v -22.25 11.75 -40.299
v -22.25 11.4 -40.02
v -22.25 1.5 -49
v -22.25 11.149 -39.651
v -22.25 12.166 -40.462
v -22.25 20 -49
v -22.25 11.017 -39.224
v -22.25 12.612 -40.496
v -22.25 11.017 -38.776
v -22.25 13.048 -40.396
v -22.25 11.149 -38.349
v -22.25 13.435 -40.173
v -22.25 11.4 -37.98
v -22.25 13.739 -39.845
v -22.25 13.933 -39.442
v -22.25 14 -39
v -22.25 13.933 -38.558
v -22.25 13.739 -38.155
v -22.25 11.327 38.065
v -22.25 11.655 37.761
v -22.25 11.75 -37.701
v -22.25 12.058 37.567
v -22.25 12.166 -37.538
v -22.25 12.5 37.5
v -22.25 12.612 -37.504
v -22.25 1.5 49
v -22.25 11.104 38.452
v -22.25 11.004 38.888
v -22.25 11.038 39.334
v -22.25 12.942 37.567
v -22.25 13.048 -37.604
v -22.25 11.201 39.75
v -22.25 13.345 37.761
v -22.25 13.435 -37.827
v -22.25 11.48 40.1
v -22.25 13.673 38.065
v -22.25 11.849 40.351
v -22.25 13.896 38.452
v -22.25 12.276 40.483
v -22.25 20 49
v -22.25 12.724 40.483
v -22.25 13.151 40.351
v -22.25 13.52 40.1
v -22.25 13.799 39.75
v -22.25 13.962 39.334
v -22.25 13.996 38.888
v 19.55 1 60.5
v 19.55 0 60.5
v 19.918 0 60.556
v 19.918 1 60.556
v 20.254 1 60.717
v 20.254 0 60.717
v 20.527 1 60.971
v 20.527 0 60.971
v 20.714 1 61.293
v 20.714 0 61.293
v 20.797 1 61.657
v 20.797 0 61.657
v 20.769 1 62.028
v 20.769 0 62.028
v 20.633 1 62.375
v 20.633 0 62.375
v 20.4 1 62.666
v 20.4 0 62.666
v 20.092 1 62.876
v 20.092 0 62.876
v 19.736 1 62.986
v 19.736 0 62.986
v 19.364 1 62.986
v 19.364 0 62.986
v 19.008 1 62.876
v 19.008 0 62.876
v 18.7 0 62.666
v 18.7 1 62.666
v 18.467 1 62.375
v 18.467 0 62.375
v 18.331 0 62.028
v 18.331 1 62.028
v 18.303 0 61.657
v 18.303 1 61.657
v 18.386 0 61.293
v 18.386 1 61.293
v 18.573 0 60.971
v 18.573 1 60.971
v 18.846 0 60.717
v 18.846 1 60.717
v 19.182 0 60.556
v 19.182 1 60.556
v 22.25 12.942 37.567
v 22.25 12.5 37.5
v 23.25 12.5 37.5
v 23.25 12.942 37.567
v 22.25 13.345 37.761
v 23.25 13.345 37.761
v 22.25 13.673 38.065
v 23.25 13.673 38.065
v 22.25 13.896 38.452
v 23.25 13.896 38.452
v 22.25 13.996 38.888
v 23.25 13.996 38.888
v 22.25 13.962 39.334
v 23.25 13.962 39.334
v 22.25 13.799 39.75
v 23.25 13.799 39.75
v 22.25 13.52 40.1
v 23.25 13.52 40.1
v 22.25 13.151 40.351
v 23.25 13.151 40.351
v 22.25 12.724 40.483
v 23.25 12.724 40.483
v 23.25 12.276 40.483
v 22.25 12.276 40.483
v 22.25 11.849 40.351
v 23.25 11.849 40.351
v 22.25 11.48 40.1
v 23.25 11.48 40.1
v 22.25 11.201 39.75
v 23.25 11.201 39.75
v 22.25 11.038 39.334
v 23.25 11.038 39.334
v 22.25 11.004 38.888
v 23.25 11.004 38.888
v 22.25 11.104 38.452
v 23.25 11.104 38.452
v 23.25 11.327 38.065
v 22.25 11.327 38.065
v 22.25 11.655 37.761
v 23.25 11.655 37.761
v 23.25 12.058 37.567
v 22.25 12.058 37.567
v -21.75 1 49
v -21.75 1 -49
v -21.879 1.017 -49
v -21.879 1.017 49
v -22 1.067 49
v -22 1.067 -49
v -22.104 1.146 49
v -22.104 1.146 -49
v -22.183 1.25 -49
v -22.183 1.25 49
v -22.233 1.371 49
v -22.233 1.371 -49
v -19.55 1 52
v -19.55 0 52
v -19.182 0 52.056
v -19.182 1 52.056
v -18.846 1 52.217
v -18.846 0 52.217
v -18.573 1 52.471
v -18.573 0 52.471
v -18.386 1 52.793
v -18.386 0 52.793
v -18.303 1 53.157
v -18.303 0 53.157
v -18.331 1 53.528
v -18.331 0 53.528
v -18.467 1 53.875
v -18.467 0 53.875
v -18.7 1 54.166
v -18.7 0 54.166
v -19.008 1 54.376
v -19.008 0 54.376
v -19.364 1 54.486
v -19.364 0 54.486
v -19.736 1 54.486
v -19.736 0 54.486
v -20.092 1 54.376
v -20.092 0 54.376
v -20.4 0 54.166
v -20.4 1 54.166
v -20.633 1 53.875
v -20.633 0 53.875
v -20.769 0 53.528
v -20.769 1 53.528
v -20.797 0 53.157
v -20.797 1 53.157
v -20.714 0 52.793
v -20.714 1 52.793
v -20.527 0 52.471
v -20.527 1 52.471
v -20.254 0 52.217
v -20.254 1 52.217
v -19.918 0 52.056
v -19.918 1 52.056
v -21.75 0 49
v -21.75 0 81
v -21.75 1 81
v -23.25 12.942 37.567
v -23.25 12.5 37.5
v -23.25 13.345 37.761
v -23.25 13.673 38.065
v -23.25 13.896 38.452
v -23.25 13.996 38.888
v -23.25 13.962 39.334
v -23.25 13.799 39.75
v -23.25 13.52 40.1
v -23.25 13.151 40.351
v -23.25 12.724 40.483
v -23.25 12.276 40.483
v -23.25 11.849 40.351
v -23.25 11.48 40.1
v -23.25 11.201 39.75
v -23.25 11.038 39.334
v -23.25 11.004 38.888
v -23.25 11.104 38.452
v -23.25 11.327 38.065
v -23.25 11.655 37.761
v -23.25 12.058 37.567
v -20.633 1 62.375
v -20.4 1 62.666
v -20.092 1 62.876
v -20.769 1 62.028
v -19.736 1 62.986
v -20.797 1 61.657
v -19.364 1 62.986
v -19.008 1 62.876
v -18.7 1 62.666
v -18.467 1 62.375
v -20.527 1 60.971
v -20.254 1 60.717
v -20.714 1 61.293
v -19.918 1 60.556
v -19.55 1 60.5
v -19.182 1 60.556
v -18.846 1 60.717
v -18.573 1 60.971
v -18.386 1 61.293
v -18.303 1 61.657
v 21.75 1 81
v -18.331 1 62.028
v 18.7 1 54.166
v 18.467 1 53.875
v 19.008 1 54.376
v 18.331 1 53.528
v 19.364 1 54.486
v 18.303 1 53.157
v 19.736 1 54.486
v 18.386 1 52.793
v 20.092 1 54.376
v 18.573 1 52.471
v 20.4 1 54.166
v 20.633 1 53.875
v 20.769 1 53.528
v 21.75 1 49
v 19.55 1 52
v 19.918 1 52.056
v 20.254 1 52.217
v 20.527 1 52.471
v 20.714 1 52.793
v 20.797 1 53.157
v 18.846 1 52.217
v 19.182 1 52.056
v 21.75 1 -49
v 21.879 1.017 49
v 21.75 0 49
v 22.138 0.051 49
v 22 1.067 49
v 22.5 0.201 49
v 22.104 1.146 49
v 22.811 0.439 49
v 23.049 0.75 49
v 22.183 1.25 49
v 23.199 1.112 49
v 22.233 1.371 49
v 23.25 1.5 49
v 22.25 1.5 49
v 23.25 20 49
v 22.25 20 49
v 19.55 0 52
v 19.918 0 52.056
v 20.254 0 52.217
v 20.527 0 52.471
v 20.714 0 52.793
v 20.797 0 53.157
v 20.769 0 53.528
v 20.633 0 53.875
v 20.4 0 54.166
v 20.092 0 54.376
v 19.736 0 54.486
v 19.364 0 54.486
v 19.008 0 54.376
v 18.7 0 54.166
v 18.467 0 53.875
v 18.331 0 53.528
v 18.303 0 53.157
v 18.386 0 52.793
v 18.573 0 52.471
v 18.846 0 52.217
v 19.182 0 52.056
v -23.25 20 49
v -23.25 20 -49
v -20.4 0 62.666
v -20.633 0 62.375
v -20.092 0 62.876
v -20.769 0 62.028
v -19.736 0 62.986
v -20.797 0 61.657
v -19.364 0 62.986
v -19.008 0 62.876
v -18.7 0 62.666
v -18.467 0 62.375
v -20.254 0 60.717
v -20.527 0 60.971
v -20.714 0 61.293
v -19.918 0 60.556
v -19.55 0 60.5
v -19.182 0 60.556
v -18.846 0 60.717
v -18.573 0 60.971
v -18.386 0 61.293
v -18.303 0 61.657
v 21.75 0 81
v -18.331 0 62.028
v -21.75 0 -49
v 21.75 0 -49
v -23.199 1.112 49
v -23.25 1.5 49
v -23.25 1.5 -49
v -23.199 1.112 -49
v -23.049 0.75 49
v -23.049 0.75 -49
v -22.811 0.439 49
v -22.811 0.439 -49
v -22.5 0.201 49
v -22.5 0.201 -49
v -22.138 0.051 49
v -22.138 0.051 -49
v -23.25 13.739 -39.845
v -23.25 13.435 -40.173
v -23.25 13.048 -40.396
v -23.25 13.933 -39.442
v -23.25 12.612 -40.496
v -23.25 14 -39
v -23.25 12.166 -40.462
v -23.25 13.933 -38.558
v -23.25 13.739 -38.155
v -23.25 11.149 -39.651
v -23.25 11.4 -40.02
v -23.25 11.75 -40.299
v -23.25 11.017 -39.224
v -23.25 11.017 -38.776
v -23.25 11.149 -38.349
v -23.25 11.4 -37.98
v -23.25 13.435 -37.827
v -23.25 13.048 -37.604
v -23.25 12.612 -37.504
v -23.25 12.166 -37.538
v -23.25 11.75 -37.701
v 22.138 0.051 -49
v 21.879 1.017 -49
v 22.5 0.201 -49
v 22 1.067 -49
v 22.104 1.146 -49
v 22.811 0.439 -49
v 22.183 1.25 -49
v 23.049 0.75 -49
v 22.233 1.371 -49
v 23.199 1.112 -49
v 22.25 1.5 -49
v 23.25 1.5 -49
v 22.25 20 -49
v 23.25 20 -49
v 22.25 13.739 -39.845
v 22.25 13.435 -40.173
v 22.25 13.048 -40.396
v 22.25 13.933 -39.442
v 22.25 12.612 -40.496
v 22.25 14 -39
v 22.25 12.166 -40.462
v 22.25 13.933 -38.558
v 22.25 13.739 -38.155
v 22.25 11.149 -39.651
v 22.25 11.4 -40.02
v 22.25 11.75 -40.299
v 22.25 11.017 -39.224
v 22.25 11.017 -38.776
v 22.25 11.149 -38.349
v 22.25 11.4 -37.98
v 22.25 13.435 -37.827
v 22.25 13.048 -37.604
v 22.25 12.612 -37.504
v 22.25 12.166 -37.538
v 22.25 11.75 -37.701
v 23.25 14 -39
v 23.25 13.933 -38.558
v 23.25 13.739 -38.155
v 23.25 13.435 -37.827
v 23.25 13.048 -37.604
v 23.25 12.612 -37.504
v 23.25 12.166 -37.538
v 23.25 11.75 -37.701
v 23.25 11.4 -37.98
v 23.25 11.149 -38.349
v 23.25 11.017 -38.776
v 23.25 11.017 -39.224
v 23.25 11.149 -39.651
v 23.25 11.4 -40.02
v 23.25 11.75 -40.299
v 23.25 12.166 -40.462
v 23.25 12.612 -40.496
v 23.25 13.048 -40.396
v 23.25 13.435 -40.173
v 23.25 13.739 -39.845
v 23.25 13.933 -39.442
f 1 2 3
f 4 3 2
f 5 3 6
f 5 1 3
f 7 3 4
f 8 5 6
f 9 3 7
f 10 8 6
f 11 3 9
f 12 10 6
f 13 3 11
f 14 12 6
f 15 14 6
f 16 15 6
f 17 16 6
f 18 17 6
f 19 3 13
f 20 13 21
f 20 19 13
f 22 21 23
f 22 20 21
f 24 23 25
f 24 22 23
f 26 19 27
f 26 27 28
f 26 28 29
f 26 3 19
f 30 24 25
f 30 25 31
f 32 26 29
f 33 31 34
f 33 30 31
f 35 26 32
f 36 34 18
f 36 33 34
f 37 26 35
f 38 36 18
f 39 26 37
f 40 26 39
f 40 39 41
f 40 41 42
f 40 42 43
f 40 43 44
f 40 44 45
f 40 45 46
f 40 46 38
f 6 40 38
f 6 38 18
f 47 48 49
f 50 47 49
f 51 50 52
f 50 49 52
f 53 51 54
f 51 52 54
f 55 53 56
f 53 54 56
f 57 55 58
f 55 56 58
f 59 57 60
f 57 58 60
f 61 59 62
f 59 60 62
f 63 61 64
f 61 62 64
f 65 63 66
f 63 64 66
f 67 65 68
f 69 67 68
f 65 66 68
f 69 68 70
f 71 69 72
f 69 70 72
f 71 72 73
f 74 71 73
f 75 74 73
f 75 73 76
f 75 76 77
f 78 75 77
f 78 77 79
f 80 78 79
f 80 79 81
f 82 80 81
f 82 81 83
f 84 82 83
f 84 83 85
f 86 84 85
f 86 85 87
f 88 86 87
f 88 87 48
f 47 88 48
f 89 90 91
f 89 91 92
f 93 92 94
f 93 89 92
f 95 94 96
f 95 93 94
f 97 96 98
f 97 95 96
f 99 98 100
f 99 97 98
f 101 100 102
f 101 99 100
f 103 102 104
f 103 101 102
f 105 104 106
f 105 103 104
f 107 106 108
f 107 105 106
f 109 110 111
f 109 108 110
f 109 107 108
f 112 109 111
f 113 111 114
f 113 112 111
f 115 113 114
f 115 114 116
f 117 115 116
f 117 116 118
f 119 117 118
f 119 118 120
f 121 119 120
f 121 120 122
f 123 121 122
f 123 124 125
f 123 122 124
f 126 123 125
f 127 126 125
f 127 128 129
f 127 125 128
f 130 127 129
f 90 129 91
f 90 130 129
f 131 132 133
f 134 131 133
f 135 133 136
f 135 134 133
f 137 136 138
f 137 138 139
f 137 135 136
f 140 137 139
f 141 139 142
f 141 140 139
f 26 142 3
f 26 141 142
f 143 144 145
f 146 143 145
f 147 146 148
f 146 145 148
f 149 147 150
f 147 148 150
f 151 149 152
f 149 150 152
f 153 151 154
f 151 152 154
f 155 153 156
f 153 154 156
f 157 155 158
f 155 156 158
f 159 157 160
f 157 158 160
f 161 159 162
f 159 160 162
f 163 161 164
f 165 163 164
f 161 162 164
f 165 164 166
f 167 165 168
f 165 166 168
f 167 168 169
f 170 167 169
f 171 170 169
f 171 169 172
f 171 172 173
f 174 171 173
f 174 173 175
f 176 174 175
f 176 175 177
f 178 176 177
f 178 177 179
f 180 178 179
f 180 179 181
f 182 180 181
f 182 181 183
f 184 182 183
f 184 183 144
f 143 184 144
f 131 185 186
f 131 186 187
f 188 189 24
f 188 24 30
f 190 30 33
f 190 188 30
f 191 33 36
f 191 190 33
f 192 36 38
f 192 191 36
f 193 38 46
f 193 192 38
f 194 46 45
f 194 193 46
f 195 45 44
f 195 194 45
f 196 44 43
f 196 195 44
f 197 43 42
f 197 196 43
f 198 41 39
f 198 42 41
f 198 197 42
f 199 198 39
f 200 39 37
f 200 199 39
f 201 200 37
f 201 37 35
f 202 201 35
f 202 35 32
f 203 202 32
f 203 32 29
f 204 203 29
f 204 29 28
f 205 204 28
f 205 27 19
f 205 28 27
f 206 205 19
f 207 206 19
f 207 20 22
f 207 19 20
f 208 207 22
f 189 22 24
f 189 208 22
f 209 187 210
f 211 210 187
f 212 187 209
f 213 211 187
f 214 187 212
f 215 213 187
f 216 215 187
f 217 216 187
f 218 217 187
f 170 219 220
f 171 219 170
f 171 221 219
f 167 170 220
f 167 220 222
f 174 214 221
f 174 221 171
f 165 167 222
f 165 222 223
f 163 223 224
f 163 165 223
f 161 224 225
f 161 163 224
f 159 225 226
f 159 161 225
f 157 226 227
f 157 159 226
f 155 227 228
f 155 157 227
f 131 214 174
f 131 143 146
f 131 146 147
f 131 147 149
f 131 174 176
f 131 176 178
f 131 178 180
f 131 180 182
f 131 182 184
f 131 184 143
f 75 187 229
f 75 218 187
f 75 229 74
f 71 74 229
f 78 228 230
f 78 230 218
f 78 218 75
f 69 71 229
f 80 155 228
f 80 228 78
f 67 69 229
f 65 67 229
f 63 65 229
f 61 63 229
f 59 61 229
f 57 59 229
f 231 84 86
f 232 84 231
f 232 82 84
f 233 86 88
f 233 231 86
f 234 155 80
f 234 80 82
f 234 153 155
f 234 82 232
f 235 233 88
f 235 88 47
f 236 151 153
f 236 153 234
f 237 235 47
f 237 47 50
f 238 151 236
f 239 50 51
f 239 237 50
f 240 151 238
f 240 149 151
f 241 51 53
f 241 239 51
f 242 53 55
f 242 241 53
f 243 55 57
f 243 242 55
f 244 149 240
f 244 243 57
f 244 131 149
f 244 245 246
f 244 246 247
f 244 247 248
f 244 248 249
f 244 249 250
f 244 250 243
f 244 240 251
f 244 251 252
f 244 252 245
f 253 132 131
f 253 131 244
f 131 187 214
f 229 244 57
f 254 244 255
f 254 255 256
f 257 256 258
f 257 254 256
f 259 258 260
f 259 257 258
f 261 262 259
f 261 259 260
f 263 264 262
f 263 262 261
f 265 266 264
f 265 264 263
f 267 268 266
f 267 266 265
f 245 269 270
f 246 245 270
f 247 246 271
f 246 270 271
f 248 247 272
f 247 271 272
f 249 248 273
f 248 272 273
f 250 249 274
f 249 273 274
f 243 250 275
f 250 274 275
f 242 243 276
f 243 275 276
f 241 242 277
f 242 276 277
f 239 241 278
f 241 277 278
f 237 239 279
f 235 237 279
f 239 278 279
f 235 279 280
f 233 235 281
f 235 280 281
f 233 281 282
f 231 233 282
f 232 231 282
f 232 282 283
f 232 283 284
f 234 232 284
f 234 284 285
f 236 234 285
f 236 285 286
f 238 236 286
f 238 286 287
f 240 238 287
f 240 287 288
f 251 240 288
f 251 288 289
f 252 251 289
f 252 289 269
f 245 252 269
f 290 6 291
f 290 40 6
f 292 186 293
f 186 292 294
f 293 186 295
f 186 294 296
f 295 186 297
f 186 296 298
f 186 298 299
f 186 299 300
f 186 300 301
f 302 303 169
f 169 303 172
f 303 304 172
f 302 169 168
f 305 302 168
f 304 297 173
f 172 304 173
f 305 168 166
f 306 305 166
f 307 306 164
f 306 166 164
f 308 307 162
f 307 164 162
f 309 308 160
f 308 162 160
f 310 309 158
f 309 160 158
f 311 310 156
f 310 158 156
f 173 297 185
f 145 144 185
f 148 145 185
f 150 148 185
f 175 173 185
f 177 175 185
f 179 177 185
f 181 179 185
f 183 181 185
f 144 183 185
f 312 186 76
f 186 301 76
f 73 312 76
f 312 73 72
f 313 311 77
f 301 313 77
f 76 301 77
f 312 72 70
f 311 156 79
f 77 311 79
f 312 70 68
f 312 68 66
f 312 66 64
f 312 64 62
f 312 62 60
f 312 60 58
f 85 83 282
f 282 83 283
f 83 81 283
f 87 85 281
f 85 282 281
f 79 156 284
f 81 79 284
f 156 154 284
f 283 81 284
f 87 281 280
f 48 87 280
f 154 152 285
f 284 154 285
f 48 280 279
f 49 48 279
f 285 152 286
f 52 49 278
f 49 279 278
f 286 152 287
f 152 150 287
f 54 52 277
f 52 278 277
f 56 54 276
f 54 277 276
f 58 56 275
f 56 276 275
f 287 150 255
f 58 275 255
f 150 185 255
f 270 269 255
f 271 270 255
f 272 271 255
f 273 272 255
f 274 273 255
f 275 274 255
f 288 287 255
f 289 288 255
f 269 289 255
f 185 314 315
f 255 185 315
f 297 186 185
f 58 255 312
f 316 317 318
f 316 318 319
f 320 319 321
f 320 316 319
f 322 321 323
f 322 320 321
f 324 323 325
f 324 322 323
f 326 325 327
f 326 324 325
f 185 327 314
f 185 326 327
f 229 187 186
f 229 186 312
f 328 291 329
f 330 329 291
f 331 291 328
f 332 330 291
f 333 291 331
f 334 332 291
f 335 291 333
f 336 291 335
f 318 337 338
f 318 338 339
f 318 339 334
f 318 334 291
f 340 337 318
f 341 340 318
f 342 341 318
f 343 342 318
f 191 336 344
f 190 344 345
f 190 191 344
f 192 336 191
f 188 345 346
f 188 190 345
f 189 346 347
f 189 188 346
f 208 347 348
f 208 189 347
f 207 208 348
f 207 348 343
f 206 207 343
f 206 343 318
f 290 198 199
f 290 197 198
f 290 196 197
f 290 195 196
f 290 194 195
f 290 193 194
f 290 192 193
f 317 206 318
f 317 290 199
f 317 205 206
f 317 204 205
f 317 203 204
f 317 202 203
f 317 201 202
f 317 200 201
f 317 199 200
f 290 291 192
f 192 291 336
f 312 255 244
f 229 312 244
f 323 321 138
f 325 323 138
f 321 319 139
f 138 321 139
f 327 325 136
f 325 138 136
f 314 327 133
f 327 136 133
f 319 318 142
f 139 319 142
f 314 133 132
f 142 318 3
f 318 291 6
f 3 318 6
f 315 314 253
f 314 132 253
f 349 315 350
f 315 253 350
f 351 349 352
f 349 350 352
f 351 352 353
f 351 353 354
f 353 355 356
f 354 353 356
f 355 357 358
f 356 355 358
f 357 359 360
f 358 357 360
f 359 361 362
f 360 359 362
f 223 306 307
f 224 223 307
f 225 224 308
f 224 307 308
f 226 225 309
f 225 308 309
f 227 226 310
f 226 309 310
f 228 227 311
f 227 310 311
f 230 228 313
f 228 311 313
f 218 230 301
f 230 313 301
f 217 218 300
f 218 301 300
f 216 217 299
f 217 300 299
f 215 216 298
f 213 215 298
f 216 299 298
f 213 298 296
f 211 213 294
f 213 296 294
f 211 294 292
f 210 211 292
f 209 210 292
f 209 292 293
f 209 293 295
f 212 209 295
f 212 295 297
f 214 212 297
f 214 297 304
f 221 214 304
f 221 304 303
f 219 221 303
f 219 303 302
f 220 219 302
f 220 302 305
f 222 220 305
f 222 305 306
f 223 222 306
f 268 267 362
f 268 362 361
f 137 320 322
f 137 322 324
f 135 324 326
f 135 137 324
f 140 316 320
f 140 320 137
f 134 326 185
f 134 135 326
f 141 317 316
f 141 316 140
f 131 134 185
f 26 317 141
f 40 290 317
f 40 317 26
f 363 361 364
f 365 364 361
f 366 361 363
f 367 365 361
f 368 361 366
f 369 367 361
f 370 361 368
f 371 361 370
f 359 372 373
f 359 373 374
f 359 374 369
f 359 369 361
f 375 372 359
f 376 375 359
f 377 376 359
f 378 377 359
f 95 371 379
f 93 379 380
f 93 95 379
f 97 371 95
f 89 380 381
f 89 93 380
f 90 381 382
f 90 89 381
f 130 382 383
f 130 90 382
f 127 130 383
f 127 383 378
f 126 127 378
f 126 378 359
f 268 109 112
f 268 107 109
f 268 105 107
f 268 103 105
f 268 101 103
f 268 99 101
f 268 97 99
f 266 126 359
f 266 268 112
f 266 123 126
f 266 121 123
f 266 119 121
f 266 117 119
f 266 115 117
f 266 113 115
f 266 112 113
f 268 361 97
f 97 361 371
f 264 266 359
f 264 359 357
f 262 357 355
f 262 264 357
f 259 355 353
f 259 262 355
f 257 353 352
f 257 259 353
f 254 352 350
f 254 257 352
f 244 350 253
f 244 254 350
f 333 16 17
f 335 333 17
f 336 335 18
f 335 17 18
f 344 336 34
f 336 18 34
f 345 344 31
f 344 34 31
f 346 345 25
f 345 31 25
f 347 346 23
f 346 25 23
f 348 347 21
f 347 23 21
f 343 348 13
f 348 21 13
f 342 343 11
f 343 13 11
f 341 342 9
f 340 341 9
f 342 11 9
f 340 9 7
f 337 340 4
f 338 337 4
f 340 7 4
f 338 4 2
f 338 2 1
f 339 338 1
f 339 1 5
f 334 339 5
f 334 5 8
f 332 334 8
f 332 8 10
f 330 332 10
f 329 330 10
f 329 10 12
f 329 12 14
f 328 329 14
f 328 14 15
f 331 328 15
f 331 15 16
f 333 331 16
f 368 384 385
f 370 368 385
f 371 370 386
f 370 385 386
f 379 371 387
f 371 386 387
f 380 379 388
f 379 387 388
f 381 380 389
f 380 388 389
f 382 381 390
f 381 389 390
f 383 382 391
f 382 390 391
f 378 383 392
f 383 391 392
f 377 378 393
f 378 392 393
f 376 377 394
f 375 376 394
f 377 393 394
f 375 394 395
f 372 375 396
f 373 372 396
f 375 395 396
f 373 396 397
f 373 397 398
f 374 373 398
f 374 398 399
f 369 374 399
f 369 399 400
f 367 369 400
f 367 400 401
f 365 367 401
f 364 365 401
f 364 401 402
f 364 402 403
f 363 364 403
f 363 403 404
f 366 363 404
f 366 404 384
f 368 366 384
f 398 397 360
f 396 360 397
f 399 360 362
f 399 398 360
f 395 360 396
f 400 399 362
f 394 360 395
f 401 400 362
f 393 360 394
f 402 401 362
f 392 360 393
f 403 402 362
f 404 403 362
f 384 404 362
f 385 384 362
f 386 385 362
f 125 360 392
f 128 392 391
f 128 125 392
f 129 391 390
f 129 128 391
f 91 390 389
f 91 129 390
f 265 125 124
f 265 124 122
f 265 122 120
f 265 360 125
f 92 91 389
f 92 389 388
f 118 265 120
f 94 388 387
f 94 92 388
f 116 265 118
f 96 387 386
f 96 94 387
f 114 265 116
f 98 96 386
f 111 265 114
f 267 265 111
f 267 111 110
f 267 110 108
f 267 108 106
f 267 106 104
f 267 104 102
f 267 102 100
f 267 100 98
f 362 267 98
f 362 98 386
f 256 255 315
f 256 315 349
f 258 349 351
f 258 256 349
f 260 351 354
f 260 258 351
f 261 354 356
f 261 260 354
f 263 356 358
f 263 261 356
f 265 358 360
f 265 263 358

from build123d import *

# Parameters (mm, degrees)
BASE_FLANGE1_DEPTH      = 49
SKETCH8_W               = 43.5
SKETCH8_H               = 1
BOSS_EXTRUDE1_DEPTH     = 32
SKETCH6_R               = 1.25
CUT_EXTRUDE1_DEPTH      = 10
CUT_EXTRUDE3_DEPTH      = 87.611561007
CUT_EXTRUDE3_DEPTH_BACK = 87.611561007
SKETCH9_R               = 1.5
SKETCH7_R               = 1.5
CUT_EXTRUDE2_DEPTH      = 70


# Sheet-metal steps are written as plain solids
with BuildPart() as part:
    # Sketch1 → Base-Flange1 (new, symmetric)
    with BuildSketch(Plane.XY):
        with BuildLine():
            Line((-23.25, 20), (-23.25, 1.5))
            ThreePointArc((-23.25, 1.5), (-22.810660172, 0.439339828), (-21.75, 0))
            Line((-21.75, 0), (21.75, 0))
            ThreePointArc((21.75, 0), (22.810660172, 0.439339828), (23.25, 1.5))
            Line((23.25, 1.5), (23.25, 20))
            Line((23.25, 20), (22.25, 20))
            Line((22.25, 20), (22.25, 1.5))
            ThreePointArc((22.25, 1.5), (22.103553391, 1.146446609), (21.75, 1))
            Line((21.75, 1), (-21.75, 1))
            ThreePointArc((-21.75, 1), (-22.103553391, 1.146446609), (-22.25, 1.5))
            Line((-22.25, 1.5), (-22.25, 20))
            Line((-22.25, 20), (-23.25, 20))
        make_face()
    extrude(amount=BASE_FLANGE1_DEPTH, both=True)

    # Sketch8 → Boss-Extrude1 (add)
    with BuildSketch(Plane.XY.offset(49)):
        with Locations((0, 0.5)):
            Rectangle(SKETCH8_W, SKETCH8_H)
    extrude(amount=BOSS_EXTRUDE1_DEPTH)

    # Sketch6 → Cut-Extrude1 (cut)
    with BuildSketch(Plane.XZ):
        with Locations(Location((19.55, 53.25, 0), (0, 0, 270))):
            Circle(SKETCH6_R)
        with Locations(Location((19.55, 61.75, 0), (0, 0, 270))):
            Circle(SKETCH6_R)
        with Locations(Location((-19.55, 53.25, 0), (0, 0, 270))):
            Circle(SKETCH6_R)
        with Locations(Location((-19.55, 61.75, 0), (0, 0, 270))):
            Circle(SKETCH6_R)
    extrude(amount=-CUT_EXTRUDE1_DEPTH, mode=Mode.SUBTRACT)

    # Sketch9 → Cut-Extrude3 (cut, two sides: drawn at the far end of the back side and taken through both)
    with BuildSketch(Plane(origin=(0, 0, 0), x_dir=(0, 0, -1), z_dir=(1, 0, 0)).offset(-CUT_EXTRUDE3_DEPTH_BACK)):
        with Locations((-39, 12.5)):
            Circle(SKETCH9_R)
    extrude(amount=CUT_EXTRUDE3_DEPTH + CUT_EXTRUDE3_DEPTH_BACK, mode=Mode.SUBTRACT)

    # Sketch7 → Cut-Extrude2 (cut)
    with BuildSketch(Plane(origin=(23.25, 0, 0), x_dir=(0, 0, -1), z_dir=(1, 0, 0))):
        with Locations(Location((39, 12.5, 0), (0, 0, 90))):
            Circle(SKETCH7_R)
    extrude(amount=-CUT_EXTRUDE2_DEPTH, mode=Mode.SUBTRACT)


solid = part.part
